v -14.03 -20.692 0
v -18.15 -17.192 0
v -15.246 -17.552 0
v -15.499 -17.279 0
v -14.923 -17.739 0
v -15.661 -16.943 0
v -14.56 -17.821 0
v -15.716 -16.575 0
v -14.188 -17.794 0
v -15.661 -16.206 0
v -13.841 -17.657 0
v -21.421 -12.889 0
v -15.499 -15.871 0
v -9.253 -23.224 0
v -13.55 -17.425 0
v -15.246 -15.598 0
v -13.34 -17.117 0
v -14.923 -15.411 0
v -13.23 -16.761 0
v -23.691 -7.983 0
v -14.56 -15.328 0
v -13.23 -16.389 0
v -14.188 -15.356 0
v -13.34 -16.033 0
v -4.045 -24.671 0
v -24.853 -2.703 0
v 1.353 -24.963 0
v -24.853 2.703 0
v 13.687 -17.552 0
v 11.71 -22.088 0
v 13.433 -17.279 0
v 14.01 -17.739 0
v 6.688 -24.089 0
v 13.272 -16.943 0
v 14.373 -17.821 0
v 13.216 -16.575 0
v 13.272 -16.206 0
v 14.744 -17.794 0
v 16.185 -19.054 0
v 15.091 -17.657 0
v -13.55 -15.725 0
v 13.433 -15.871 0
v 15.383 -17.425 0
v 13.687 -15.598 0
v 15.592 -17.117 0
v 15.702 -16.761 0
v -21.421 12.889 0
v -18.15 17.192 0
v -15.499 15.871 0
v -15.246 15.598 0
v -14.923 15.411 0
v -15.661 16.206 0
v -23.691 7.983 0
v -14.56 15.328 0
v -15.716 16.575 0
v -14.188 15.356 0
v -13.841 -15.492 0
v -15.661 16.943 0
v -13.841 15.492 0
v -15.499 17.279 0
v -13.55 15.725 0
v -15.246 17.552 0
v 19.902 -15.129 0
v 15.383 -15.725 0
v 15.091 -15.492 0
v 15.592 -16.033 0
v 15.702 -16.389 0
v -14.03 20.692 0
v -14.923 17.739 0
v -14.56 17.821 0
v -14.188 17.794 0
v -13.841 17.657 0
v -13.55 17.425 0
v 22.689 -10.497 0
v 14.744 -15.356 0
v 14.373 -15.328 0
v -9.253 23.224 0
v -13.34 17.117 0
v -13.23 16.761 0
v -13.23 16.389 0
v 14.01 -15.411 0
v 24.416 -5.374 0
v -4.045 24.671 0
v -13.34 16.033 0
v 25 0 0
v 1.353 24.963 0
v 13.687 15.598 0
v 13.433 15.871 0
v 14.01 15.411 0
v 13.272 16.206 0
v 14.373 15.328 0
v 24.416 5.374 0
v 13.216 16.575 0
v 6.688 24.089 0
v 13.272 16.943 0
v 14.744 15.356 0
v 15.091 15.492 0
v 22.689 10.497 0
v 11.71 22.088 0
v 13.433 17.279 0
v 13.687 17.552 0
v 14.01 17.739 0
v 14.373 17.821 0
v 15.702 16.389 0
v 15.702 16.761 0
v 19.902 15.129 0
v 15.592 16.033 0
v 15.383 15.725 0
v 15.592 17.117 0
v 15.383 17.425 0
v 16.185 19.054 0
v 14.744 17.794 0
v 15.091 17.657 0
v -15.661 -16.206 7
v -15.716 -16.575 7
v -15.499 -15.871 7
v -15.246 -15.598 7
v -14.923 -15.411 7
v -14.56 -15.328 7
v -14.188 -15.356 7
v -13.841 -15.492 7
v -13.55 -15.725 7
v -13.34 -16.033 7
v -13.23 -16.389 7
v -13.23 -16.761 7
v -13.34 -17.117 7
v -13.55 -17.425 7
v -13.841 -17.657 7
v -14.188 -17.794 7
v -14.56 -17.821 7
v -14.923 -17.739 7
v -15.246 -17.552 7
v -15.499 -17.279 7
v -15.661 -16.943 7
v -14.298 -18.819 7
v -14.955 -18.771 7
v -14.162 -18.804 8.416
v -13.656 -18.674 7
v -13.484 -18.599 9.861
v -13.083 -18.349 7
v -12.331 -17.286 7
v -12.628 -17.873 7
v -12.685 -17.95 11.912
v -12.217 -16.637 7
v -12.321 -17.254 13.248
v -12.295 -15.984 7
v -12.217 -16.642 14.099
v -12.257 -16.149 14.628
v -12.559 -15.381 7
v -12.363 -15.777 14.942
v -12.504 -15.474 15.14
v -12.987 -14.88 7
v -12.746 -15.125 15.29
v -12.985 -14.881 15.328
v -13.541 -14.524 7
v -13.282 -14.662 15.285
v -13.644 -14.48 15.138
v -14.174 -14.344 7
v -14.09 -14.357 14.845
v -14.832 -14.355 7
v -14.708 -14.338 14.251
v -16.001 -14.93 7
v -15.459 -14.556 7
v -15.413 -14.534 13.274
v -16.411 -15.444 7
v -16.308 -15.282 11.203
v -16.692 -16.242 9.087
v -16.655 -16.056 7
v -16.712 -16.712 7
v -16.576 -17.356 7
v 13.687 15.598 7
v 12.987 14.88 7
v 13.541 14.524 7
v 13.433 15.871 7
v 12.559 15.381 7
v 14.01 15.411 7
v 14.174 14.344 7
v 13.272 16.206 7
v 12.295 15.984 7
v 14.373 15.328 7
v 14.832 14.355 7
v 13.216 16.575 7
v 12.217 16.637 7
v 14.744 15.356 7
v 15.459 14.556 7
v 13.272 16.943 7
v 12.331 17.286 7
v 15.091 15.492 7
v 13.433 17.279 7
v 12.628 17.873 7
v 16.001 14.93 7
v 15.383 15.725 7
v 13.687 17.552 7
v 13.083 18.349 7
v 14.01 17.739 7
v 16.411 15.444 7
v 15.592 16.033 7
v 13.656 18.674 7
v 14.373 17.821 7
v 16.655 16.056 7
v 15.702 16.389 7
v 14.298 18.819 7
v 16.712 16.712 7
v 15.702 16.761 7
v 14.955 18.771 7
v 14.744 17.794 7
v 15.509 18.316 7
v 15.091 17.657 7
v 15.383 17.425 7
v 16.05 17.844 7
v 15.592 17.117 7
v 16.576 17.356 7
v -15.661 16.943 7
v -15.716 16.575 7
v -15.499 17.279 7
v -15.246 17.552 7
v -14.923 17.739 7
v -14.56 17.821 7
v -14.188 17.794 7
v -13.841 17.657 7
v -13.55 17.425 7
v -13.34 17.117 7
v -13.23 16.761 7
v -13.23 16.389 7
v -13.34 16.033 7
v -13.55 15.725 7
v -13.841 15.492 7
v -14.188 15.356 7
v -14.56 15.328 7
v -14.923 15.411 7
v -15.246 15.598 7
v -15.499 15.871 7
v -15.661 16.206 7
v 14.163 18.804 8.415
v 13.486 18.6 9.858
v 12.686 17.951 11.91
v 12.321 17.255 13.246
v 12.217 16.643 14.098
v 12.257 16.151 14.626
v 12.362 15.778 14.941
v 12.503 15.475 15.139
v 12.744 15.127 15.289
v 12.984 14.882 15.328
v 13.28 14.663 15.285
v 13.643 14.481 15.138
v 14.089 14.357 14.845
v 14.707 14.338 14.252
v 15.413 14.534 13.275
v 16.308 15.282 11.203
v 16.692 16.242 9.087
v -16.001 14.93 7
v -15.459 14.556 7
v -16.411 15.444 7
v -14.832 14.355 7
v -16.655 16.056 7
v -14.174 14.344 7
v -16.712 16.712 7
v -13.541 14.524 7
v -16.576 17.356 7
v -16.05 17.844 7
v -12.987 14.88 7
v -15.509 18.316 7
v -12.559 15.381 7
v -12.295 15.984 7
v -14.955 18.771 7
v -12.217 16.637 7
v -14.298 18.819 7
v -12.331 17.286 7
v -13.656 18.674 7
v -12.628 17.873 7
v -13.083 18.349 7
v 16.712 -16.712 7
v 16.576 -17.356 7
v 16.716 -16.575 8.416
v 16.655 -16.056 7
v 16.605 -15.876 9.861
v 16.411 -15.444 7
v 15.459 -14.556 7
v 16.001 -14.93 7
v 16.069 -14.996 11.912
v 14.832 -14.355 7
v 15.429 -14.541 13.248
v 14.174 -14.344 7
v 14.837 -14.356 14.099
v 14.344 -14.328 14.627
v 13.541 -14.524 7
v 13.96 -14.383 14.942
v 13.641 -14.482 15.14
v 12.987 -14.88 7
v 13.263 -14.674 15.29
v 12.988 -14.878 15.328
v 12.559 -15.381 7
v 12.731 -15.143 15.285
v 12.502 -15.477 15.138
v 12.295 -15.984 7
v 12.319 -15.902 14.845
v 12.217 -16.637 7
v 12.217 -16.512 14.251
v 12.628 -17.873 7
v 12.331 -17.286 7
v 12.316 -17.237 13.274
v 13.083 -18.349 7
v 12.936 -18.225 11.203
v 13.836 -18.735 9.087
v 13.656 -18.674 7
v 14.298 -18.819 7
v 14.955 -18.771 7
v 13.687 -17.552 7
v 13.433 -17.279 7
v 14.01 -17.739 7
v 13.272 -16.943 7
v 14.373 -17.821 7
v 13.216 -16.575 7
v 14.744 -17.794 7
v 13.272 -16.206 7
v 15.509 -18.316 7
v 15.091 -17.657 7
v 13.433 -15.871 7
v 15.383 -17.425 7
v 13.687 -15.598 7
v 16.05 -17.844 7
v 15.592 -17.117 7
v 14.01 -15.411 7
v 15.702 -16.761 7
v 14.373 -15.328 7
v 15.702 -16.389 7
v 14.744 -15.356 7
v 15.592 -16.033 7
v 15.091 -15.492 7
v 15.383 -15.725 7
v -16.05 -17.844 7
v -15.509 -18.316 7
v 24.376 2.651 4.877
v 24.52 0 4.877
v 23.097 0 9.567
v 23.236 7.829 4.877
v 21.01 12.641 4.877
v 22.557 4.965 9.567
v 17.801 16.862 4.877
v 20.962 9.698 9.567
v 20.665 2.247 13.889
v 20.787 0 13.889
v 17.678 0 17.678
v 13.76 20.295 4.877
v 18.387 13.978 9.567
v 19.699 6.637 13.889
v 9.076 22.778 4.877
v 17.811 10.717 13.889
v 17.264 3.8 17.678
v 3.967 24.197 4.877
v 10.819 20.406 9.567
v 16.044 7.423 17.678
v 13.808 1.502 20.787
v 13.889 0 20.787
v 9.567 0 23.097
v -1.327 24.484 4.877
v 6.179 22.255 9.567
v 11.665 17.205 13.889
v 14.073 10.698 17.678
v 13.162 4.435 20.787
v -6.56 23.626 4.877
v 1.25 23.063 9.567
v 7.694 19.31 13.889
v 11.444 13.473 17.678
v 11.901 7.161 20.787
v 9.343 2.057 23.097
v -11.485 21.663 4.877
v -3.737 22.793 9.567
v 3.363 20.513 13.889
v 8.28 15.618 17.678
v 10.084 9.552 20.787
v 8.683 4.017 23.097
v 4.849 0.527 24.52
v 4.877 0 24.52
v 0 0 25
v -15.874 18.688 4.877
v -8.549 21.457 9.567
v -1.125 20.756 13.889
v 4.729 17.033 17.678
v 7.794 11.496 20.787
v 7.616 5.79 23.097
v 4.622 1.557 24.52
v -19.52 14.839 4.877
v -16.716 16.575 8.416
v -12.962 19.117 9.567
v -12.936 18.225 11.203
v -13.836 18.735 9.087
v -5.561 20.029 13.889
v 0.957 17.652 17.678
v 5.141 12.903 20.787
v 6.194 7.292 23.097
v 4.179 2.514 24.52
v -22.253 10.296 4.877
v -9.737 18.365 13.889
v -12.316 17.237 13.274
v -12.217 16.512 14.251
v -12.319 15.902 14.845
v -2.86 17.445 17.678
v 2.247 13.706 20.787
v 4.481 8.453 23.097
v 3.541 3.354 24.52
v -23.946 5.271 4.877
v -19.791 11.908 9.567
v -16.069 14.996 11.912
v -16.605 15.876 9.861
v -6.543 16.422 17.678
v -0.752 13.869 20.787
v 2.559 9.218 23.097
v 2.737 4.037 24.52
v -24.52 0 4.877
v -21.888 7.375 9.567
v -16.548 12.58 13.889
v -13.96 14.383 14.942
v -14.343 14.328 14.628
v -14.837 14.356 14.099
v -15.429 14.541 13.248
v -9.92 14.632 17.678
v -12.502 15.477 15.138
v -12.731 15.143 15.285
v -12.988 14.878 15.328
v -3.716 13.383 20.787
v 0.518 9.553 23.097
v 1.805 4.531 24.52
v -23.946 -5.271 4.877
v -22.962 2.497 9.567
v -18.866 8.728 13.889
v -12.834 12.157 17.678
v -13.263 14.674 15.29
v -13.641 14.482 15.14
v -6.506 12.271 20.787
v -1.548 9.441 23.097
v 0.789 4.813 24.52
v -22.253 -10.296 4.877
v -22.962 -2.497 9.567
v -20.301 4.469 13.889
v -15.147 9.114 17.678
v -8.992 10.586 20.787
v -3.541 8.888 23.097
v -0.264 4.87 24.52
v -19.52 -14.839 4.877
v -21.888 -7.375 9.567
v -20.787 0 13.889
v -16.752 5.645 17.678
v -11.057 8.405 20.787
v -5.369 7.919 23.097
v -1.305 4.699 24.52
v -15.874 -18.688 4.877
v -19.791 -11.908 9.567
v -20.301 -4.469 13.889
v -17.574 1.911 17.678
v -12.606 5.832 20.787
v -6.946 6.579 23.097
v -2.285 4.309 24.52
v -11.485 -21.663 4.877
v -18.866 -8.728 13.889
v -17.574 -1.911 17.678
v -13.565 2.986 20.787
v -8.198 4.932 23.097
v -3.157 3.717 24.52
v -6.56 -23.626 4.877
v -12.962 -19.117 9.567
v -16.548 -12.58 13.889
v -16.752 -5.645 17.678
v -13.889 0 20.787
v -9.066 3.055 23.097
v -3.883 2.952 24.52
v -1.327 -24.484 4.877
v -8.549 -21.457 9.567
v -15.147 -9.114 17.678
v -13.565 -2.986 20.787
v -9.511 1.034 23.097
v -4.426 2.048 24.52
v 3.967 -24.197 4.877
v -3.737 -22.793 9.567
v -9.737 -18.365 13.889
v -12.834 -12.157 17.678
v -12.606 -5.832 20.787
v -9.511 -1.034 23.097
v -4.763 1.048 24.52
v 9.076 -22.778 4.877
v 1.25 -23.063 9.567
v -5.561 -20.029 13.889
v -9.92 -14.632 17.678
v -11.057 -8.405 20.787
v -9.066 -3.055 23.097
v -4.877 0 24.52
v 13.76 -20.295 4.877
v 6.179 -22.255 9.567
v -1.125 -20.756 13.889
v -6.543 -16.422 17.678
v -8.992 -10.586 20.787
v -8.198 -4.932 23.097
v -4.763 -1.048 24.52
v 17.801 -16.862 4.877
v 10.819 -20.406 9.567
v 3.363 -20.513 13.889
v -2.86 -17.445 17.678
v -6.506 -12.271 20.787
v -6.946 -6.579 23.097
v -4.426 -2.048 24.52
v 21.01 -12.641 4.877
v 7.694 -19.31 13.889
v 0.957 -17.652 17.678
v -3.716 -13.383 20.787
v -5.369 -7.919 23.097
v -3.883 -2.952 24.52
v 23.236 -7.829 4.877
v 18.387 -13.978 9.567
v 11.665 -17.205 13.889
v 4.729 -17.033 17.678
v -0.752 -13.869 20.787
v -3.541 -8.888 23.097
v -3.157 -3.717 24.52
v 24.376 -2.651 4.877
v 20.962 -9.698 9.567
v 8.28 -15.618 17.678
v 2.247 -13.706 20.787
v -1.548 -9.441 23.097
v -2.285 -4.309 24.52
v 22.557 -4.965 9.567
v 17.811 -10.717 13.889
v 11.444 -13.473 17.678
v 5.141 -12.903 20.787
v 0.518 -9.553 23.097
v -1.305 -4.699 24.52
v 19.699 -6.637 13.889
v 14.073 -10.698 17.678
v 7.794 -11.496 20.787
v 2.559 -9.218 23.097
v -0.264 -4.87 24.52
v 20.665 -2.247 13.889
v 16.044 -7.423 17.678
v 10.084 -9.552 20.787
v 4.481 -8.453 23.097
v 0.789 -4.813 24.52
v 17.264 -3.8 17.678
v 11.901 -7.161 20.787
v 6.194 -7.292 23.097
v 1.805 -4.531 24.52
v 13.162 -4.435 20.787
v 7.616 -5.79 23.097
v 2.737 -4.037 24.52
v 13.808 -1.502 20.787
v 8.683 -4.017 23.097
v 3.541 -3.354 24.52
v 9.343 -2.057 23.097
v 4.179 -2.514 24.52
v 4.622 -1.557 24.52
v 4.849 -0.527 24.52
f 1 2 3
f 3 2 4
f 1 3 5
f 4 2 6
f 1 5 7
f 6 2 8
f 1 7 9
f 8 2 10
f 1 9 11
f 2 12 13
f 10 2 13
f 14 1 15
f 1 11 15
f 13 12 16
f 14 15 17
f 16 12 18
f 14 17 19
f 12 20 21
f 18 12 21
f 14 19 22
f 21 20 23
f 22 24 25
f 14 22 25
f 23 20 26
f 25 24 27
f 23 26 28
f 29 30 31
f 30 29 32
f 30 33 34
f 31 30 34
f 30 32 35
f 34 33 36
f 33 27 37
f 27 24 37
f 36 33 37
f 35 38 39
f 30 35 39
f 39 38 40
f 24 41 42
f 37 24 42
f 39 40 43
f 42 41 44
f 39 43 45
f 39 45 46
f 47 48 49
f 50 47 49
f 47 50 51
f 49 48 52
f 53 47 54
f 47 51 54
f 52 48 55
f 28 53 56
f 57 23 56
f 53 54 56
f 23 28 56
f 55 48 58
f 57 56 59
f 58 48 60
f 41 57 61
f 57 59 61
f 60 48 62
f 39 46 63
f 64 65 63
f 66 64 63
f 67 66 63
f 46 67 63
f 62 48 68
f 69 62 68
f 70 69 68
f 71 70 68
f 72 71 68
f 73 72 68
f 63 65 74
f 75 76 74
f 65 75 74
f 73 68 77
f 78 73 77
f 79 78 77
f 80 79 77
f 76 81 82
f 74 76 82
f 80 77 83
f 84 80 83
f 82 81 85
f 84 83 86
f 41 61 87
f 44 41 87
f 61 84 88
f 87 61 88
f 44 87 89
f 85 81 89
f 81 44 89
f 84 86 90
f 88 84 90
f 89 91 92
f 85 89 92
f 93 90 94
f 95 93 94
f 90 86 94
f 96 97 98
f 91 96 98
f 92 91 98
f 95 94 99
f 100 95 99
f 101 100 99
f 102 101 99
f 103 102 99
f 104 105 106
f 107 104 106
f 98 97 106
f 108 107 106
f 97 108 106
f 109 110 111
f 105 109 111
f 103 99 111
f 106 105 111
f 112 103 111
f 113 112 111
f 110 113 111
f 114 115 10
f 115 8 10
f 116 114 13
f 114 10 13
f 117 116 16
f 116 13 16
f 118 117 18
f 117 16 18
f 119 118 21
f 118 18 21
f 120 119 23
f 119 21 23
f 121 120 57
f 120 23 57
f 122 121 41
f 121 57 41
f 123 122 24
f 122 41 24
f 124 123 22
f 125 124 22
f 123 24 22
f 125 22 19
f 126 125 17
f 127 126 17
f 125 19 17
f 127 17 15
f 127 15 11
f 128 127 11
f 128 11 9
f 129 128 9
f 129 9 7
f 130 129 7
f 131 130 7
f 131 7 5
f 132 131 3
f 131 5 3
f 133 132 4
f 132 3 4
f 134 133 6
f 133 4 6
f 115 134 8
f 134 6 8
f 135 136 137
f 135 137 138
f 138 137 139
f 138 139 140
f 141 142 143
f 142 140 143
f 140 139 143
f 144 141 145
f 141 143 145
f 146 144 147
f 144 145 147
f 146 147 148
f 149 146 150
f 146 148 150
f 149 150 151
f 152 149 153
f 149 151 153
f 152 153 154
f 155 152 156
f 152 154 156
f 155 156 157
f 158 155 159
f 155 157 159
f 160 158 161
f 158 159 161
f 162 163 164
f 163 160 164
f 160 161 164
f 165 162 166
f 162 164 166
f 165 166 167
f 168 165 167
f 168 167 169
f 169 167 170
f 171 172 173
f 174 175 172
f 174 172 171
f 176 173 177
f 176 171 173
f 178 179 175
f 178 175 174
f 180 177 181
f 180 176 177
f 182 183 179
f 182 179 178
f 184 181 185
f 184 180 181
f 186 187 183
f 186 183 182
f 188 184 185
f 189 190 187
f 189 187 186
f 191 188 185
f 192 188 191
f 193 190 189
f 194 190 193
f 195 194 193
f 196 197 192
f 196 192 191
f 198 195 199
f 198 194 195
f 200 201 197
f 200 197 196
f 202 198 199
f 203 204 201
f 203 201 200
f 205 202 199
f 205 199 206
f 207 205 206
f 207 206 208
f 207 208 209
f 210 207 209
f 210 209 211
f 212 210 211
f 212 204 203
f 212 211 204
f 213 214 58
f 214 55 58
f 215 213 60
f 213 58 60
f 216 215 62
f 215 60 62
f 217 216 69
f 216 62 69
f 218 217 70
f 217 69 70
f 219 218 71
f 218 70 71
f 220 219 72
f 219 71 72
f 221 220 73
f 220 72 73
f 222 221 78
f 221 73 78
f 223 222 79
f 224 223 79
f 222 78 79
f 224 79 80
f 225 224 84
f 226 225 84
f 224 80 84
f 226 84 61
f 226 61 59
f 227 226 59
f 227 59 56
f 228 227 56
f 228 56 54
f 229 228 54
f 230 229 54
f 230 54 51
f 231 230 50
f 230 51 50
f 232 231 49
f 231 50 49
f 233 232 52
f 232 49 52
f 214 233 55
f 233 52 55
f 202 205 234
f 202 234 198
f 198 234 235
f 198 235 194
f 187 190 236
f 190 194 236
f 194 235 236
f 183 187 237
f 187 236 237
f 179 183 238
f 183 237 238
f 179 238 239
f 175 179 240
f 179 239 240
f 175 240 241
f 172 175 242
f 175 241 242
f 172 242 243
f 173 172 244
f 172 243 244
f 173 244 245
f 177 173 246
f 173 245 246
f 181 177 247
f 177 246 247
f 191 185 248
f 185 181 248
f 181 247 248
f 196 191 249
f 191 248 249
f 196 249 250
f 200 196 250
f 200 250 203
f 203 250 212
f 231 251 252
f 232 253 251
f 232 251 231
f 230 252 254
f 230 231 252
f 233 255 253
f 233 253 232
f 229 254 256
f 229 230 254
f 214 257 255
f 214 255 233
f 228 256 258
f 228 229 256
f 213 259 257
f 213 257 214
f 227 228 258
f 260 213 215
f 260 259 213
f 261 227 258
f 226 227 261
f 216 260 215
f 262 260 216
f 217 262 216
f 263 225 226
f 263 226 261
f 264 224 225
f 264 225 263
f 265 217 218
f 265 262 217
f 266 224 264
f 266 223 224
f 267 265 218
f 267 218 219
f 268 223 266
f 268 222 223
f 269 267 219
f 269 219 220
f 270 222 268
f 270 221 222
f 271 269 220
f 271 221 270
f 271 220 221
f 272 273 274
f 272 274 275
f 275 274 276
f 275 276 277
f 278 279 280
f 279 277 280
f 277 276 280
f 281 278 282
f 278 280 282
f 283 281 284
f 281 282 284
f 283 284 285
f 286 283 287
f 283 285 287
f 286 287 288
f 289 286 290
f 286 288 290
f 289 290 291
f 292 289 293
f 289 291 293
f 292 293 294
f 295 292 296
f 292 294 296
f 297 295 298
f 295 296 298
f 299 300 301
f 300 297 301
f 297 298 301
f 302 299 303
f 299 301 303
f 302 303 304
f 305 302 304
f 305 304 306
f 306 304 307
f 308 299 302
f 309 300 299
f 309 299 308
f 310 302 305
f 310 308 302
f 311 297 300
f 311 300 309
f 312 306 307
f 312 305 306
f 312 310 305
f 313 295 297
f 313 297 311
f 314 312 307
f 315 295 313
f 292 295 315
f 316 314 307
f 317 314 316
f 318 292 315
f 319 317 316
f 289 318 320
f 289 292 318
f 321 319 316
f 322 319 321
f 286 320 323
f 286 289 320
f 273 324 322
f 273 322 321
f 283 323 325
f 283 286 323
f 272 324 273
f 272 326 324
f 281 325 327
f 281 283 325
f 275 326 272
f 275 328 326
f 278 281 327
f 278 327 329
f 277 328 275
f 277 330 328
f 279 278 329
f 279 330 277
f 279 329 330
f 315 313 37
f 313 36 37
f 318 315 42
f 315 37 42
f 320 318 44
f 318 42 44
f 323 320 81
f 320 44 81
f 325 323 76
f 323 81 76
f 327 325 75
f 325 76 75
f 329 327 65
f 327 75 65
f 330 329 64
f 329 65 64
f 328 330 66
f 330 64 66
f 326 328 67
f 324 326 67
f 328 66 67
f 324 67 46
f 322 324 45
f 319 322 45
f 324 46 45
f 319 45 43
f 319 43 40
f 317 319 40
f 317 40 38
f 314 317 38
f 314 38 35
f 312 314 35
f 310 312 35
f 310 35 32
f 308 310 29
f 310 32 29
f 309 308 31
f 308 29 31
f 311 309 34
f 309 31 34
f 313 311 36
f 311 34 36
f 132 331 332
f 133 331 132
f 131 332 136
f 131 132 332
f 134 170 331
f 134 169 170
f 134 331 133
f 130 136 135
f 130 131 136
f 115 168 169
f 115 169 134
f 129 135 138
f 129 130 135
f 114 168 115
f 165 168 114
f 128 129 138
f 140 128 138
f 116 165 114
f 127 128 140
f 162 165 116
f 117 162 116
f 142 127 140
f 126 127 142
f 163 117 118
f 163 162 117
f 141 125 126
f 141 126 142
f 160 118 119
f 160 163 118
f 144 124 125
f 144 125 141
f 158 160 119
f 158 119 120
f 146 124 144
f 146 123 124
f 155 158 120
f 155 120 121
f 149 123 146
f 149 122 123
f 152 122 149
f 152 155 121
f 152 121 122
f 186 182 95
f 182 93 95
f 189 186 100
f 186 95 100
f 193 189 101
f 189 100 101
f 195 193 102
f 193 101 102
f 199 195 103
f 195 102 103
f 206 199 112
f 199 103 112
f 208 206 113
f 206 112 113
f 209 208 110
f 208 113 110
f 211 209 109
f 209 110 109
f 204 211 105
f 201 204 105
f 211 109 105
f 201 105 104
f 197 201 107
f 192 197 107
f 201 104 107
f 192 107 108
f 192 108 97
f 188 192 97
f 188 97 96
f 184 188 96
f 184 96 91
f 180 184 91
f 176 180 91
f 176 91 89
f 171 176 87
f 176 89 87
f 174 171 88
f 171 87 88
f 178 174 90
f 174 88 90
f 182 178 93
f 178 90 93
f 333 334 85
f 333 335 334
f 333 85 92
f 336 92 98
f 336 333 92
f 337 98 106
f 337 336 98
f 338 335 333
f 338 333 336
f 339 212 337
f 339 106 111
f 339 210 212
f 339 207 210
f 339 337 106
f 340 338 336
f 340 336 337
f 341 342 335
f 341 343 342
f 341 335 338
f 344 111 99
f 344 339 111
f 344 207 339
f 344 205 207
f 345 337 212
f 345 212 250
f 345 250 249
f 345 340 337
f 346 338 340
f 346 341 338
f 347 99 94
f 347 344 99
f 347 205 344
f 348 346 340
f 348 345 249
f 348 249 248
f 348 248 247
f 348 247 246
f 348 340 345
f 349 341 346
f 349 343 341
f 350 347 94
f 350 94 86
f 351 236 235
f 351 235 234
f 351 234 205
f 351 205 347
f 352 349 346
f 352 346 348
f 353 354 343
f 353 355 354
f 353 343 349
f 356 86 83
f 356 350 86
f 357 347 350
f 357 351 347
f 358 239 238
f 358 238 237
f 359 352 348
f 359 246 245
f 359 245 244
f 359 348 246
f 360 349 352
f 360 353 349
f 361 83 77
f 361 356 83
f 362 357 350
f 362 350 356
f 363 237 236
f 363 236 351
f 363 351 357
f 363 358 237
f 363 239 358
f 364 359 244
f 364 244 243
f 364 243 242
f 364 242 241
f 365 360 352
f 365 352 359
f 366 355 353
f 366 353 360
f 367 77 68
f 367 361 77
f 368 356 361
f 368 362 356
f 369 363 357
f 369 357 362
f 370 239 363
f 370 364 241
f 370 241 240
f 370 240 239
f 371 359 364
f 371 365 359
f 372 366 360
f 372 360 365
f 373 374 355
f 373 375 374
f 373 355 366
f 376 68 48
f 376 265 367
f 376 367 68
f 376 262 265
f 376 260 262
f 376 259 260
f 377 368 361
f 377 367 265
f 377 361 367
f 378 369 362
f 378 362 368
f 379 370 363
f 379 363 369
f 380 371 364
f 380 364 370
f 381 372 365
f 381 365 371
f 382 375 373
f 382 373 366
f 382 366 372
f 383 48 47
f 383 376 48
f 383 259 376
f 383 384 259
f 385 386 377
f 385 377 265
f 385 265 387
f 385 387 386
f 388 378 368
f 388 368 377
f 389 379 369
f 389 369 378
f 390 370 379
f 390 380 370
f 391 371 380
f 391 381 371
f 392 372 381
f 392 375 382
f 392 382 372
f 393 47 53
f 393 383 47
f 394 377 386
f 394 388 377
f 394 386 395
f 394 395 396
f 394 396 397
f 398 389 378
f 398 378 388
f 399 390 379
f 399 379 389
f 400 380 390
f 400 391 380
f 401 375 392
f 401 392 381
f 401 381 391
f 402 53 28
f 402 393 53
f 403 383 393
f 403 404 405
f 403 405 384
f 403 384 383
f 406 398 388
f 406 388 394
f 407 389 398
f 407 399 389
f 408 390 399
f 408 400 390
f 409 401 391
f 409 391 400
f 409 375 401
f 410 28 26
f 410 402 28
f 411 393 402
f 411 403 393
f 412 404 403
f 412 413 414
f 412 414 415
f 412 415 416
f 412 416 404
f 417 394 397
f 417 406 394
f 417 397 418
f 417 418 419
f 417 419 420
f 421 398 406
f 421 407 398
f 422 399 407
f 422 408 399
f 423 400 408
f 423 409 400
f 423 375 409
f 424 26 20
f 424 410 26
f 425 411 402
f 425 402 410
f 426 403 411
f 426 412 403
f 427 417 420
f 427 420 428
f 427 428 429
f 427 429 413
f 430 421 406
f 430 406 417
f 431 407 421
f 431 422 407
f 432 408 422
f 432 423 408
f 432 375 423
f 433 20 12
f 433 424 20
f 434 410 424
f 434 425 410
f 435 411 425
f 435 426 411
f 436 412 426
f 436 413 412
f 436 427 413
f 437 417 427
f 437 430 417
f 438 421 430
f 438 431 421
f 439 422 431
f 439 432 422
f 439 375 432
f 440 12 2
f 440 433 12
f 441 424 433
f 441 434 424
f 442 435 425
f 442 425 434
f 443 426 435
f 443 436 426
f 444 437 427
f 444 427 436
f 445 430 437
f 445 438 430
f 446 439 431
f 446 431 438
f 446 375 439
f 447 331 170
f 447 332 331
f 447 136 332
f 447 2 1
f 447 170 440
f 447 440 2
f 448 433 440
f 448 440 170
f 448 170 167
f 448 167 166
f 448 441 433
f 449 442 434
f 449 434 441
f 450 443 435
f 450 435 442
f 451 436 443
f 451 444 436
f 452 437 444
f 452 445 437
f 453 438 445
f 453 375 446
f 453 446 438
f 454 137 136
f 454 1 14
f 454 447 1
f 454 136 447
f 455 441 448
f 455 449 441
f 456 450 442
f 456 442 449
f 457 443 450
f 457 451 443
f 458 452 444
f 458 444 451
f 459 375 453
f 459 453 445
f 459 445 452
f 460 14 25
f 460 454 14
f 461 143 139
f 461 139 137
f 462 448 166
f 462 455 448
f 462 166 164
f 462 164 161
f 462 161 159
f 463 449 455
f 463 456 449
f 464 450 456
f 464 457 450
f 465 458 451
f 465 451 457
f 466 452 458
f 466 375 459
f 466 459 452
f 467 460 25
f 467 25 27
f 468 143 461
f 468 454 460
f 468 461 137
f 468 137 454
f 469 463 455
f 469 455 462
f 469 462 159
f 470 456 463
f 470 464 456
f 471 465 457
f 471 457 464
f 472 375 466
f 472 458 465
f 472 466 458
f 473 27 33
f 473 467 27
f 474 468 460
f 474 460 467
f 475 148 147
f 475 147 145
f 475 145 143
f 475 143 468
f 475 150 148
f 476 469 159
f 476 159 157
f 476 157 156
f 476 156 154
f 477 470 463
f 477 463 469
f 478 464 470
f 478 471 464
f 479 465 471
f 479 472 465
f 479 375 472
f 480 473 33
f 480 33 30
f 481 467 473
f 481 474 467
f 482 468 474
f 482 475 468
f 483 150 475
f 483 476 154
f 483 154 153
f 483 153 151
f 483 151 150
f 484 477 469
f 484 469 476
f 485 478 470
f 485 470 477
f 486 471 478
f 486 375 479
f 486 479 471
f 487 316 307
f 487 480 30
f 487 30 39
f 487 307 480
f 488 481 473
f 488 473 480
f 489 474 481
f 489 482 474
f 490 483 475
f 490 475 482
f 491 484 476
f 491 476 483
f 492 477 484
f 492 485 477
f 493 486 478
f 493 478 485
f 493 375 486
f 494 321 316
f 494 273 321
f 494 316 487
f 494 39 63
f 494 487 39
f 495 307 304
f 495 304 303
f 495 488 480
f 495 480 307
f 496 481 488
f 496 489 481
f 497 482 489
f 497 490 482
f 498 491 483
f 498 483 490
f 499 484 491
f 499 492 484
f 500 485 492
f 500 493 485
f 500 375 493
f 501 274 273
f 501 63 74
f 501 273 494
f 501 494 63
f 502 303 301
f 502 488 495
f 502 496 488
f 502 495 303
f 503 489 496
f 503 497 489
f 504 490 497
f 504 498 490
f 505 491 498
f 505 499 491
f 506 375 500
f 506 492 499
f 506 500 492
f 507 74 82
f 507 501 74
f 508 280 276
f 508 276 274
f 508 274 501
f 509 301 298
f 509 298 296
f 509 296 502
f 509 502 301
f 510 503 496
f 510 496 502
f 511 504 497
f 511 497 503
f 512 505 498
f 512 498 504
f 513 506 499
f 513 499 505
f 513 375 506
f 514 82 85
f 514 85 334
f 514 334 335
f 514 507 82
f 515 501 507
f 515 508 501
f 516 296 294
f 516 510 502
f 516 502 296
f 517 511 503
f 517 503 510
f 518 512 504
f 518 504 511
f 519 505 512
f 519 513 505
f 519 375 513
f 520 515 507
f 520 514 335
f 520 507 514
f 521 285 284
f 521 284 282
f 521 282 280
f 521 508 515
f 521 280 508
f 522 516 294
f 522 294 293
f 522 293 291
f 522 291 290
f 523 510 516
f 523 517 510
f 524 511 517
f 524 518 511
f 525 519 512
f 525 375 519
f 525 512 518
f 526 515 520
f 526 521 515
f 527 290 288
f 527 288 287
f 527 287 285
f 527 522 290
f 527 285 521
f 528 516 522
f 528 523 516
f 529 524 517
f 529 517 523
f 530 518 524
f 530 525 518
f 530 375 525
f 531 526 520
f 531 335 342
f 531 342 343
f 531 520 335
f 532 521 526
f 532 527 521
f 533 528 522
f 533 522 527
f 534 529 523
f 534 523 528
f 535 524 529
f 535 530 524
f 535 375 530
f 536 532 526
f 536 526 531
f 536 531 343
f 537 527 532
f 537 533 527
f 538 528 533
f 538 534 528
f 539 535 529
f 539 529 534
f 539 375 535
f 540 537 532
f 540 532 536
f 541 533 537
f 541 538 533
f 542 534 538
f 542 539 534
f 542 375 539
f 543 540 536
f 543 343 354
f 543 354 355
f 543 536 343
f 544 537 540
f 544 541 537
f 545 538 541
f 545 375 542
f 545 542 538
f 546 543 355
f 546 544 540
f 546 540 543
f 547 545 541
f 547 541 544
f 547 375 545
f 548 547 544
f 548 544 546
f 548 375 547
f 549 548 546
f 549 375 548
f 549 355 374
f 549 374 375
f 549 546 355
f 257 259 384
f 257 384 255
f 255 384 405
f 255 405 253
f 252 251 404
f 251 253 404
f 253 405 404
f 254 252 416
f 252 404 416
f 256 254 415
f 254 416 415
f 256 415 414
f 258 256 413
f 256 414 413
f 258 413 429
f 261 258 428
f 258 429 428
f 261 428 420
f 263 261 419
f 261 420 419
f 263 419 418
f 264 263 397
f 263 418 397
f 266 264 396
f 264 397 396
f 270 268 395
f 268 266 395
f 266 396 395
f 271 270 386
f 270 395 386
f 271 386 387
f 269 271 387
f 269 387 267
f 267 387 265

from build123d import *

# Parameters (mm, degrees)
F0_R           = 25
F1_DEPTH       = 25
F3_D           = 2.5
F3_CBORE_D     = 4.5
F3_CBORE_DEPTH = 18


# Not quite as in the source:
# - a fillet or chamfer that OpenCascade refuses, or shapes differently, is made with other operations: its cross-section is extruded or revolved along the edge and cut away or added


with BuildPart() as f1:
    # F0 (on Top) → F1 (new body)
    with BuildSketch(Plane.XY):
        Circle(F0_R)
    extrude(amount=F1_DEPTH)

    # F3 (through all)
    with Locations(Plane.XY.offset(25)):
        with Locations((14.4662138687, 16.5749406124), (14.4662138687, -16.5749406124), (-14.4662138687, -16.5749406124), (-14.4662138687, 16.5749406124)):
            CounterBoreHole(F3_D / 2, F3_CBORE_D / 2, F3_CBORE_DEPTH)

    # F4: fillet of radius 25 on 1 edges, made by hand

    # F4_s1 → F4_t2 (revolve, cut)
    with BuildSketch(Plane.XZ):
        with BuildLine():
            ThreePointArc((25, 0), (17.6776695297, 17.6776695297), (0, 25))
            Line((0, 25), (25, 25))
            Line((25, 25), (25, 0))
        make_face()
    revolve(axis=Axis((0, 0, 25), (0, 0, 1)), mode=Mode.SUBTRACT)


solid = f1.part
